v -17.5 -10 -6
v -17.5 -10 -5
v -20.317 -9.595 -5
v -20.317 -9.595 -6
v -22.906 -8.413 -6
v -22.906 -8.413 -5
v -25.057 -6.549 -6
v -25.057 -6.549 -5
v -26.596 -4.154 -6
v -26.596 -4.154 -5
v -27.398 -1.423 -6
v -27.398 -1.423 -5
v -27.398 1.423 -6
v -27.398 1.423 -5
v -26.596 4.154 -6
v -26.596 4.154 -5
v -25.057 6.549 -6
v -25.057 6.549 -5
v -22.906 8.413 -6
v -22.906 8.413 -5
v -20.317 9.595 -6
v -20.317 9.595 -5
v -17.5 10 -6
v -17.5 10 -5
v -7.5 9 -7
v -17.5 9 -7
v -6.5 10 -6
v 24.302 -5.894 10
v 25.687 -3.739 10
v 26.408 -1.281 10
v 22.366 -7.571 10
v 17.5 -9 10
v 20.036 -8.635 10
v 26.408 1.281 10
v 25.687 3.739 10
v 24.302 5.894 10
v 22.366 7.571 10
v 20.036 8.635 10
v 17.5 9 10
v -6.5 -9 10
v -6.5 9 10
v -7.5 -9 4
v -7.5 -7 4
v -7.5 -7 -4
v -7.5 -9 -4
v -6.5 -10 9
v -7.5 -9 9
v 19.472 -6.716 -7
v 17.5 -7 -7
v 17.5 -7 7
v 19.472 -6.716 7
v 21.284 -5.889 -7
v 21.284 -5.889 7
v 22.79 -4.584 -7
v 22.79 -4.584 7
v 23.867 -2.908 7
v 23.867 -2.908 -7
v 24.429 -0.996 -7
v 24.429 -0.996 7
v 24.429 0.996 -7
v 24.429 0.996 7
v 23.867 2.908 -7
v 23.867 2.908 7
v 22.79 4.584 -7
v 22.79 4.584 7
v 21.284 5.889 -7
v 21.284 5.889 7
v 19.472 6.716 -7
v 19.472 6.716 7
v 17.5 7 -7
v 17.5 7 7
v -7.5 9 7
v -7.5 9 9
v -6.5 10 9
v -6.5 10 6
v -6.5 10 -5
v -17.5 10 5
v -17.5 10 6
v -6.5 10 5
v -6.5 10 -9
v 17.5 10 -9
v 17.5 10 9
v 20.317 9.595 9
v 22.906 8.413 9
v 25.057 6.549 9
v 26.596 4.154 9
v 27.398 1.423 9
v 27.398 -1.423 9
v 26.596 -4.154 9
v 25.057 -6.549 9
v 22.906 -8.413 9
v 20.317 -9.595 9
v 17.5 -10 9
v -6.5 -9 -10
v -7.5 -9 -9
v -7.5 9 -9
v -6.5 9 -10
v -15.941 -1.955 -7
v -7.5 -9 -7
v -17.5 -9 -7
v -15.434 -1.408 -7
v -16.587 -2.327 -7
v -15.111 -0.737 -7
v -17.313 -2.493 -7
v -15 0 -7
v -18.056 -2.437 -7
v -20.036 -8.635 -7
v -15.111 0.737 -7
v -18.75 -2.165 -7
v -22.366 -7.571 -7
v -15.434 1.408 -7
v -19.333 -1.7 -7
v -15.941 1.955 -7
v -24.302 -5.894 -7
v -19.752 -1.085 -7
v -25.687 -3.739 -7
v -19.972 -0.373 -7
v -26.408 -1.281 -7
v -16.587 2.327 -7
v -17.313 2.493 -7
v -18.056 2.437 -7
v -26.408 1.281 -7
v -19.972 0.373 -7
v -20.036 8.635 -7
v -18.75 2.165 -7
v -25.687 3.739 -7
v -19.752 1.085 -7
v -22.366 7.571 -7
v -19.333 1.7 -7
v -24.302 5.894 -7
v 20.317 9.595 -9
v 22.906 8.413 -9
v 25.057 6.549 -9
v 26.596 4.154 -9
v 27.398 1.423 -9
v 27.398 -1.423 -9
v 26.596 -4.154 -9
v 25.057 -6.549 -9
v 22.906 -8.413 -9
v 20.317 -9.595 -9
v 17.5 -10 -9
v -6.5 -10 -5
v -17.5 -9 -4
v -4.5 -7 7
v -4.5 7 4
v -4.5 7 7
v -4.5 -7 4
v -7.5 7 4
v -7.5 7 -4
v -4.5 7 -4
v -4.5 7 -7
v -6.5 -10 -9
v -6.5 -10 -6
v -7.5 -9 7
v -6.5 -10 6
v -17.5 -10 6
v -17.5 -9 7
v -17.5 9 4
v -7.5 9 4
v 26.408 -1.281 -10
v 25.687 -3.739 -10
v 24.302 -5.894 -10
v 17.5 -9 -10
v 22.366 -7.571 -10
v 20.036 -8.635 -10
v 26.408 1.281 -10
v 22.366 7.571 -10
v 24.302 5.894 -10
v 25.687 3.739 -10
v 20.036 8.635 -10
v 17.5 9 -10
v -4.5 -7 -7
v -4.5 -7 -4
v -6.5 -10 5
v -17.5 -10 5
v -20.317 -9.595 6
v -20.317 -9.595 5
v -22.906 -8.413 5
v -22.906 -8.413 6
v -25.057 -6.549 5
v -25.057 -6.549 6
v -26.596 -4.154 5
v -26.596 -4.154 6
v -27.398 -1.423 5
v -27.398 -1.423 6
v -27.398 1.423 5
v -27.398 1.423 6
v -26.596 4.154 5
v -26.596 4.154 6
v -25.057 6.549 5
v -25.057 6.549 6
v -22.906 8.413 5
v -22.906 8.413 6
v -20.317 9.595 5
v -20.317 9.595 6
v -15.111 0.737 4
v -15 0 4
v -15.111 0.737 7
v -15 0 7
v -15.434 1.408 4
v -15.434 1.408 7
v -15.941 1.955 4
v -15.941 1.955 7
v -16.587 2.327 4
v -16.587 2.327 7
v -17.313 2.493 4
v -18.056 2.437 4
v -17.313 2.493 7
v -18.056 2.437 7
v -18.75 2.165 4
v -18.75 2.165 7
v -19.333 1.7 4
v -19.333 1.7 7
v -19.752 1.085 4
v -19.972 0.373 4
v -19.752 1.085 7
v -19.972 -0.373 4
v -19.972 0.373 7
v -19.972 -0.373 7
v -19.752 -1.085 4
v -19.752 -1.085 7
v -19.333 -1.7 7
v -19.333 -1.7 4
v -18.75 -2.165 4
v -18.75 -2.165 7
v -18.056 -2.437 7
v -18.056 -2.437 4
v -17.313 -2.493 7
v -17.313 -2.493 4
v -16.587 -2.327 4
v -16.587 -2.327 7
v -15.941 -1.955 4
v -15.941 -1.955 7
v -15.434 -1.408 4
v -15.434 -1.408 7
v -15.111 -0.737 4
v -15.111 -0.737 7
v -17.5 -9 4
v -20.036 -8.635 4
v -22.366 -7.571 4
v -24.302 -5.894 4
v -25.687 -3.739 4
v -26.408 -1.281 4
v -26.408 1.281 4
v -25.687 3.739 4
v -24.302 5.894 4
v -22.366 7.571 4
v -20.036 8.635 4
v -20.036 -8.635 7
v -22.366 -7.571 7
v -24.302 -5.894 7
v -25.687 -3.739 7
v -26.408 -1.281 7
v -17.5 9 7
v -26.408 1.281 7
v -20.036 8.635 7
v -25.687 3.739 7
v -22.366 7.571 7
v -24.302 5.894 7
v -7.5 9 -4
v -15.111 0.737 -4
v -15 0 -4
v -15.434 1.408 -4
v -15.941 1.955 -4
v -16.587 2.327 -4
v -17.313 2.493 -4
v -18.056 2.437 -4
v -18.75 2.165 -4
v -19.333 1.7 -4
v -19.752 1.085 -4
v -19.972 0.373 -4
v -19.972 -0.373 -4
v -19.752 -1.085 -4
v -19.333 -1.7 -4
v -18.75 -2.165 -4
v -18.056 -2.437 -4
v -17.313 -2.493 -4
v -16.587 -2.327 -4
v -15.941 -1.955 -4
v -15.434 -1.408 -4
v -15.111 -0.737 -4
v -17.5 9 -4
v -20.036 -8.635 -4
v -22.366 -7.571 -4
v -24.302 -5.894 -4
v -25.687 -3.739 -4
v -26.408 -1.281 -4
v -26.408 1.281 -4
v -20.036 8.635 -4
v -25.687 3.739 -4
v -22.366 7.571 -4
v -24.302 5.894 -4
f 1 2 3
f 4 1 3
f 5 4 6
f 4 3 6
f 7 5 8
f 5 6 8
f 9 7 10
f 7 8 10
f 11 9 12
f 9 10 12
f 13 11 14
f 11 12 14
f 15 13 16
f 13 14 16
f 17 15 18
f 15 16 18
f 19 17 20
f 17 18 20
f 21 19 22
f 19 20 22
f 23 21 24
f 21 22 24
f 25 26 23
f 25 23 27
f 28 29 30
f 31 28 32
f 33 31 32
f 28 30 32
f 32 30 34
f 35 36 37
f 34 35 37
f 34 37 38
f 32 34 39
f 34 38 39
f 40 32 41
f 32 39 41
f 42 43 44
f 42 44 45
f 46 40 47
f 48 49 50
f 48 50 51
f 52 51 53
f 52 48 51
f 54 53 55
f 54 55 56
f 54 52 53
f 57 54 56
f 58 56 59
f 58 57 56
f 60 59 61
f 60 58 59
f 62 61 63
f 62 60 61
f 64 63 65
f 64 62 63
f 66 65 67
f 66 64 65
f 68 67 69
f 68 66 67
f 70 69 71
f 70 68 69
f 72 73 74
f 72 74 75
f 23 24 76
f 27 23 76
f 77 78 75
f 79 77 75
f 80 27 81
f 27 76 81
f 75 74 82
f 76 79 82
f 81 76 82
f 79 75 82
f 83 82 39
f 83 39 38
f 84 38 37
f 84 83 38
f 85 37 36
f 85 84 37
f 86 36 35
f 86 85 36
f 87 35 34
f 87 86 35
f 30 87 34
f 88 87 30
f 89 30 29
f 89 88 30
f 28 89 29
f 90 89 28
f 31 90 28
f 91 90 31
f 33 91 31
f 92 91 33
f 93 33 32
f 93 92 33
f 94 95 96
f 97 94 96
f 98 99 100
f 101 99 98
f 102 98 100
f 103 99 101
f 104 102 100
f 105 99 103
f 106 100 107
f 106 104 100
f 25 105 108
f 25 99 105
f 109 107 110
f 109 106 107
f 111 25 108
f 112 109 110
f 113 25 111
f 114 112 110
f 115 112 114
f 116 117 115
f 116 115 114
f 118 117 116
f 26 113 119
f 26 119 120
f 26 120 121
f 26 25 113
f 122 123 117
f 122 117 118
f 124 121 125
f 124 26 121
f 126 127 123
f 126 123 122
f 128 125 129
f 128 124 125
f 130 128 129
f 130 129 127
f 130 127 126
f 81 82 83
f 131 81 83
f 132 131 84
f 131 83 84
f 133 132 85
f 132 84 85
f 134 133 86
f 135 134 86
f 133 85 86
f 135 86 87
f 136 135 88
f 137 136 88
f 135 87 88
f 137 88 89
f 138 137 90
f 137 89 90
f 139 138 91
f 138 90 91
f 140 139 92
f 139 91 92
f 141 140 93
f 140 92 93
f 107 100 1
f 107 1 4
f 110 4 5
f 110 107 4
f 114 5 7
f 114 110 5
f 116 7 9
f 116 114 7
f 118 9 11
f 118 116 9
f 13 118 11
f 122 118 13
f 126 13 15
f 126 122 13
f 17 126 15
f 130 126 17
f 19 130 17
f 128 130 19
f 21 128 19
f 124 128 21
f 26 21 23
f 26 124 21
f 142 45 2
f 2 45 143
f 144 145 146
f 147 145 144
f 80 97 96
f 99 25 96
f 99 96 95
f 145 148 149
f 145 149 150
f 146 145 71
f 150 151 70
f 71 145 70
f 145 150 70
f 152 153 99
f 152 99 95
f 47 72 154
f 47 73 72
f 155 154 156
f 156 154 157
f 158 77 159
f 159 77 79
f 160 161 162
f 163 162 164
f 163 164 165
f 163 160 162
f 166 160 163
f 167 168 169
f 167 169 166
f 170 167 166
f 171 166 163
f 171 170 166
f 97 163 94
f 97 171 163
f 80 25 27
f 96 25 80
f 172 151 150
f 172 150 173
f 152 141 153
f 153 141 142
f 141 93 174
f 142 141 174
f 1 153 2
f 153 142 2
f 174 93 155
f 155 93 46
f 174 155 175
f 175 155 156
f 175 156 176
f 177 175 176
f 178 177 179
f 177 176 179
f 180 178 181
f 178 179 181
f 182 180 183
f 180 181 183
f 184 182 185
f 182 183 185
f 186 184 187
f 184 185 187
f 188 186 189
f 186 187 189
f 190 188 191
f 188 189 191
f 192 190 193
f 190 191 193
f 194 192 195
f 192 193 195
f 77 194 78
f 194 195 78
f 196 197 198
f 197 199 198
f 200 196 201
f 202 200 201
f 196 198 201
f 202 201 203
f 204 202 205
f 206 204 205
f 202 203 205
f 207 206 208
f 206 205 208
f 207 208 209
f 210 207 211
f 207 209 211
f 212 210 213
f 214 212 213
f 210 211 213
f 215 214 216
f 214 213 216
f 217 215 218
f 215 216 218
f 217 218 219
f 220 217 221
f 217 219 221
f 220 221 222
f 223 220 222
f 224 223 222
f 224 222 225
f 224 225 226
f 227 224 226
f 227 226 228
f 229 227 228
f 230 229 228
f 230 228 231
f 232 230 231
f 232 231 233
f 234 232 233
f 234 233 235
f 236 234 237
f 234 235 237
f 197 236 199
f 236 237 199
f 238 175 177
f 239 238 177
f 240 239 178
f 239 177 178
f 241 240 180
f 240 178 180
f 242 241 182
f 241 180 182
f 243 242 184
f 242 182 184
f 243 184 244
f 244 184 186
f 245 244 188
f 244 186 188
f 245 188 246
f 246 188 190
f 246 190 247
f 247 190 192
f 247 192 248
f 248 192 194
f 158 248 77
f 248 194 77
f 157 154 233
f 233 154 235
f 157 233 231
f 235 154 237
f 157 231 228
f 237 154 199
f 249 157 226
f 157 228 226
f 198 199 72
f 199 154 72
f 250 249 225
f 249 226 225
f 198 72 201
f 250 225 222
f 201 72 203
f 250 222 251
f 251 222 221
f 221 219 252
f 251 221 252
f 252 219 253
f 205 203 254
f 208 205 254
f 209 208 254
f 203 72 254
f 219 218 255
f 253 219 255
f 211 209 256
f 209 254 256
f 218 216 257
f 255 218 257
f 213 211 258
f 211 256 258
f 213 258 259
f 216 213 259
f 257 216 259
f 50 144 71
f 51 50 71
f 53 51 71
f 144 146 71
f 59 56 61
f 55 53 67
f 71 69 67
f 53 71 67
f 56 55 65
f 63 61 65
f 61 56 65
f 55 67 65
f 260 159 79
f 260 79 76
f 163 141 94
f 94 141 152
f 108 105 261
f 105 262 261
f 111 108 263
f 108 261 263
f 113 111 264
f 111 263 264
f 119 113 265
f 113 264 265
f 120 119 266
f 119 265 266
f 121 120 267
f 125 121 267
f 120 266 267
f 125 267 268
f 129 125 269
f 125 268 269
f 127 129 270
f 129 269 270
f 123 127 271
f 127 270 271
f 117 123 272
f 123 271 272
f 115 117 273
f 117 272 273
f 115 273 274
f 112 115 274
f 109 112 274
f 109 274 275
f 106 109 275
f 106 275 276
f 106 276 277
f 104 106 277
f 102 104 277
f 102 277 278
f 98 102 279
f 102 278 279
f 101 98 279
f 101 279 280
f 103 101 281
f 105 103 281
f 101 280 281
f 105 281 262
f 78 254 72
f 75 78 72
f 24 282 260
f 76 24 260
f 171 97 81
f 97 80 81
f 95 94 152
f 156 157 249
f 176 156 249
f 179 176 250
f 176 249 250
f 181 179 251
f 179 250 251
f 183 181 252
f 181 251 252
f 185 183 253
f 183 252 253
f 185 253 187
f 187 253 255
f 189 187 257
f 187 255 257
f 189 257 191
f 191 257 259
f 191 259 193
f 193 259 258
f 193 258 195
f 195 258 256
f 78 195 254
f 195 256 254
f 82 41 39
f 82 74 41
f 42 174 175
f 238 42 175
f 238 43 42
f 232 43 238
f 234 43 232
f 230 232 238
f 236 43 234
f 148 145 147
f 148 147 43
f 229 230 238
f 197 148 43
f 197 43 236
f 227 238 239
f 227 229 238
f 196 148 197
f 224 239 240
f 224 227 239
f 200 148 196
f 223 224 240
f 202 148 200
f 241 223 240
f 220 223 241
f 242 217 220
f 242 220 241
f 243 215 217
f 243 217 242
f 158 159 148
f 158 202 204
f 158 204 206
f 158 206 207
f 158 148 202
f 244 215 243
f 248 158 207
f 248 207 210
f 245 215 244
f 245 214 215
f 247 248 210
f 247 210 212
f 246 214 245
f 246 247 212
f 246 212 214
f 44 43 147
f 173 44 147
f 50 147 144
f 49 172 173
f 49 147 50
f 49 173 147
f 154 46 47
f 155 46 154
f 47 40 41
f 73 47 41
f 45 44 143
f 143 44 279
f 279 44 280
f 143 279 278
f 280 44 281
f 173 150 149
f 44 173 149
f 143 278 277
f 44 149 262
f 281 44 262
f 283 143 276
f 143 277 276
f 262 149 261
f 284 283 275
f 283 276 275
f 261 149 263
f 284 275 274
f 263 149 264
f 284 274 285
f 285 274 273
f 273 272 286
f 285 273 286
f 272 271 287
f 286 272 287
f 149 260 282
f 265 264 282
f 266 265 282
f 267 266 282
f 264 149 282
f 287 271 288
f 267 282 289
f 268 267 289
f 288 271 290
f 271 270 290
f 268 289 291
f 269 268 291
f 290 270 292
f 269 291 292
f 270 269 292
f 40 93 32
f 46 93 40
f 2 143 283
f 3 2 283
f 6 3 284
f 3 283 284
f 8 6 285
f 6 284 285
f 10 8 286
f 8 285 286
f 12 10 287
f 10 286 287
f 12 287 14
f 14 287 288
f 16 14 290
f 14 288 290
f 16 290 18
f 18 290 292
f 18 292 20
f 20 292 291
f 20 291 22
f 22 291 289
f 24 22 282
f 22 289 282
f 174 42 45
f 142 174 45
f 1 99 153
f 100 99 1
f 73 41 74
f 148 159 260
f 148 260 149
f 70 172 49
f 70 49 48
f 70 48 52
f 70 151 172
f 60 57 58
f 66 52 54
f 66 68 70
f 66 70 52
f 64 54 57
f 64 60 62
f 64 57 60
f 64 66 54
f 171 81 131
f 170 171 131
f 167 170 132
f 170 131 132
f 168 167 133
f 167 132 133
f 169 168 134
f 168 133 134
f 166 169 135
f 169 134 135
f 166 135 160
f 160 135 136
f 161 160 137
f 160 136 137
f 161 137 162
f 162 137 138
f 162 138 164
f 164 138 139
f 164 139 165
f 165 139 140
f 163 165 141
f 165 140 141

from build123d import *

# Parameters (mm, degrees)
BOSS_EXTRUDE1_DEPTH = 10
CUT_EXTRUDE1_DEPTH  = 4
CUT_EXTRUDE2_START  = -7
CUT_EXTRUDE2_DEPTH  = 7
CUT_EXTRUDE3_START  = 14
CUT_EXTRUDE3_DEPTH  = 7
SKETCH3_R           = 2.5
CUT_EXTRUDE4_DEPTH  = 10
SHELL1_START        = -7
SHELL1_DEPTH        = 14
SHELL1_START_2      = -4
SHELL1_2_OUTLINE_W  = 3
SHELL1_2_OUTLINE_H  = 14
SHELL1_2_DEPTH      = 8
CHAMFER1_SIZE       = 1


# Read off the part's stored shape, not the designer's step: Shell1
with BuildPart() as part:
    # Sketch1 → Boss-Extrude1 (new, symmetric)
    with BuildSketch(Plane.XY):
        with BuildLine():
            Line((-17.5, 10), (17.5, 10))
            ThreePointArc((17.5, 10), (27.5, 0), (17.5, -10))
            Line((17.5, -10), (-17.5, -10))
            ThreePointArc((-17.5, -10), (-27.5, 0), (-17.5, 10))
        make_face()
    extrude(amount=BOSS_EXTRUDE1_DEPTH, both=True)

    # Sketch2 → Cut-Extrude1 (cut, symmetric)
    with BuildSketch(Plane.XY):
        with BuildLine():
            Line((-17.5, 10), (-7.5, 10))
            Line((-7.5, 10), (-7.5, -10))
            Line((-7.5, -10), (-17.5, -10))
            ThreePointArc((-17.5, -10), (-27.5, 0), (-17.5, 10))
        make_face()
    extrude(amount=CUT_EXTRUDE1_DEPTH, both=True, mode=Mode.SUBTRACT)

    # Sketch2<2> → Cut-Extrude2 (cut)
    with BuildSketch(Plane.XY.offset(CUT_EXTRUDE2_START)):
        with BuildLine():
            Line((-17.5, 10), (-7.5, 10))
            Line((-7.5, 10), (-7.5, -10))
            Line((-7.5, -10), (-17.5, -10))
            ThreePointArc((-17.5, -10), (-27.5, 0), (-17.5, 10))
        make_face()
    extrude(amount=-CUT_EXTRUDE2_DEPTH, mode=Mode.SUBTRACT)

    # Sketch2<3> → Cut-Extrude3 (cut)
    with BuildSketch(Plane.XY.offset(CUT_EXTRUDE3_START)):
        with BuildLine():
            Line((-17.5, 10), (-7.5, 10))
            Line((-7.5, 10), (-7.5, -10))
            Line((-7.5, -10), (-17.5, -10))
            ThreePointArc((-17.5, -10), (-27.5, 0), (-17.5, 10))
        make_face()
    extrude(amount=-CUT_EXTRUDE3_DEPTH, mode=Mode.SUBTRACT)

    # Sketch3 → Cut-Extrude4 (cut, symmetric)
    with BuildSketch(Plane.XY):
        with Locations((-17.5, 0)):
            Circle(SKETCH3_R)
    extrude(amount=CUT_EXTRUDE4_DEPTH, both=True, mode=Mode.SUBTRACT)

    # Shell1 outline → Shell1 (cut)
    with BuildSketch(Plane.XY.offset(SHELL1_START)):
        with BuildLine():
            Line((-4.5, -7), (17.5, -7))
            ThreePointArc((17.5, -7), (24.5, 0), (17.5, 7))
            Line((17.5, 7), (-4.5, 7))
            Line((-4.5, 7), (-4.5, -7))
        make_face()
    extrude(amount=SHELL1_DEPTH, mode=Mode.SUBTRACT)

    # Shell1 2 outline → Shell1 2 (cut)
    with BuildSketch(Plane.XY.offset(SHELL1_START_2)):
        with Locations((-6, 0)):
            Rectangle(SHELL1_2_OUTLINE_W, SHELL1_2_OUTLINE_H)
    extrude(amount=SHELL1_2_DEPTH, mode=Mode.SUBTRACT)

    # Chamfer1
    chamfer1_edges = [part.edges().sort_by_distance(p)[0] for p in [
        (27.5, 0, 10),
        (5, 10, 10),
        (-27.5, 0, -4),
        (-12.5, 10, -4),
        (-7.5, 10, 0),
        (-12.5, -10, -4),
        (-7.5, -10, 0),
        (-27.5, 0, 4),
        (-12.5, -10, 4),
        (-12.5, 10, 4),
        (5, -10, -10),
        (-7.5, 0, -10),
        (-7.5, 10, -8.5),
        (-7.5, -10, -8.5),
        (-27.5, 0, -7),
        (-12.5, -10, -7),
        (-12.5, 10, -7),
        (5, 10, -10),
        (5, -10, 10),
        (-7.5, 0, 10),
        (27.5, 0, -10),
        (-27.5, 0, 7),
        (-12.5, -10, 7),
        (-7.5, -10, 8.5),
        (-7.5, 10, 8.5),
        (-12.5, 10, 7),
    ]]
    chamfer(chamfer1_edges, length=CHAMFER1_SIZE)


solid = part.part
